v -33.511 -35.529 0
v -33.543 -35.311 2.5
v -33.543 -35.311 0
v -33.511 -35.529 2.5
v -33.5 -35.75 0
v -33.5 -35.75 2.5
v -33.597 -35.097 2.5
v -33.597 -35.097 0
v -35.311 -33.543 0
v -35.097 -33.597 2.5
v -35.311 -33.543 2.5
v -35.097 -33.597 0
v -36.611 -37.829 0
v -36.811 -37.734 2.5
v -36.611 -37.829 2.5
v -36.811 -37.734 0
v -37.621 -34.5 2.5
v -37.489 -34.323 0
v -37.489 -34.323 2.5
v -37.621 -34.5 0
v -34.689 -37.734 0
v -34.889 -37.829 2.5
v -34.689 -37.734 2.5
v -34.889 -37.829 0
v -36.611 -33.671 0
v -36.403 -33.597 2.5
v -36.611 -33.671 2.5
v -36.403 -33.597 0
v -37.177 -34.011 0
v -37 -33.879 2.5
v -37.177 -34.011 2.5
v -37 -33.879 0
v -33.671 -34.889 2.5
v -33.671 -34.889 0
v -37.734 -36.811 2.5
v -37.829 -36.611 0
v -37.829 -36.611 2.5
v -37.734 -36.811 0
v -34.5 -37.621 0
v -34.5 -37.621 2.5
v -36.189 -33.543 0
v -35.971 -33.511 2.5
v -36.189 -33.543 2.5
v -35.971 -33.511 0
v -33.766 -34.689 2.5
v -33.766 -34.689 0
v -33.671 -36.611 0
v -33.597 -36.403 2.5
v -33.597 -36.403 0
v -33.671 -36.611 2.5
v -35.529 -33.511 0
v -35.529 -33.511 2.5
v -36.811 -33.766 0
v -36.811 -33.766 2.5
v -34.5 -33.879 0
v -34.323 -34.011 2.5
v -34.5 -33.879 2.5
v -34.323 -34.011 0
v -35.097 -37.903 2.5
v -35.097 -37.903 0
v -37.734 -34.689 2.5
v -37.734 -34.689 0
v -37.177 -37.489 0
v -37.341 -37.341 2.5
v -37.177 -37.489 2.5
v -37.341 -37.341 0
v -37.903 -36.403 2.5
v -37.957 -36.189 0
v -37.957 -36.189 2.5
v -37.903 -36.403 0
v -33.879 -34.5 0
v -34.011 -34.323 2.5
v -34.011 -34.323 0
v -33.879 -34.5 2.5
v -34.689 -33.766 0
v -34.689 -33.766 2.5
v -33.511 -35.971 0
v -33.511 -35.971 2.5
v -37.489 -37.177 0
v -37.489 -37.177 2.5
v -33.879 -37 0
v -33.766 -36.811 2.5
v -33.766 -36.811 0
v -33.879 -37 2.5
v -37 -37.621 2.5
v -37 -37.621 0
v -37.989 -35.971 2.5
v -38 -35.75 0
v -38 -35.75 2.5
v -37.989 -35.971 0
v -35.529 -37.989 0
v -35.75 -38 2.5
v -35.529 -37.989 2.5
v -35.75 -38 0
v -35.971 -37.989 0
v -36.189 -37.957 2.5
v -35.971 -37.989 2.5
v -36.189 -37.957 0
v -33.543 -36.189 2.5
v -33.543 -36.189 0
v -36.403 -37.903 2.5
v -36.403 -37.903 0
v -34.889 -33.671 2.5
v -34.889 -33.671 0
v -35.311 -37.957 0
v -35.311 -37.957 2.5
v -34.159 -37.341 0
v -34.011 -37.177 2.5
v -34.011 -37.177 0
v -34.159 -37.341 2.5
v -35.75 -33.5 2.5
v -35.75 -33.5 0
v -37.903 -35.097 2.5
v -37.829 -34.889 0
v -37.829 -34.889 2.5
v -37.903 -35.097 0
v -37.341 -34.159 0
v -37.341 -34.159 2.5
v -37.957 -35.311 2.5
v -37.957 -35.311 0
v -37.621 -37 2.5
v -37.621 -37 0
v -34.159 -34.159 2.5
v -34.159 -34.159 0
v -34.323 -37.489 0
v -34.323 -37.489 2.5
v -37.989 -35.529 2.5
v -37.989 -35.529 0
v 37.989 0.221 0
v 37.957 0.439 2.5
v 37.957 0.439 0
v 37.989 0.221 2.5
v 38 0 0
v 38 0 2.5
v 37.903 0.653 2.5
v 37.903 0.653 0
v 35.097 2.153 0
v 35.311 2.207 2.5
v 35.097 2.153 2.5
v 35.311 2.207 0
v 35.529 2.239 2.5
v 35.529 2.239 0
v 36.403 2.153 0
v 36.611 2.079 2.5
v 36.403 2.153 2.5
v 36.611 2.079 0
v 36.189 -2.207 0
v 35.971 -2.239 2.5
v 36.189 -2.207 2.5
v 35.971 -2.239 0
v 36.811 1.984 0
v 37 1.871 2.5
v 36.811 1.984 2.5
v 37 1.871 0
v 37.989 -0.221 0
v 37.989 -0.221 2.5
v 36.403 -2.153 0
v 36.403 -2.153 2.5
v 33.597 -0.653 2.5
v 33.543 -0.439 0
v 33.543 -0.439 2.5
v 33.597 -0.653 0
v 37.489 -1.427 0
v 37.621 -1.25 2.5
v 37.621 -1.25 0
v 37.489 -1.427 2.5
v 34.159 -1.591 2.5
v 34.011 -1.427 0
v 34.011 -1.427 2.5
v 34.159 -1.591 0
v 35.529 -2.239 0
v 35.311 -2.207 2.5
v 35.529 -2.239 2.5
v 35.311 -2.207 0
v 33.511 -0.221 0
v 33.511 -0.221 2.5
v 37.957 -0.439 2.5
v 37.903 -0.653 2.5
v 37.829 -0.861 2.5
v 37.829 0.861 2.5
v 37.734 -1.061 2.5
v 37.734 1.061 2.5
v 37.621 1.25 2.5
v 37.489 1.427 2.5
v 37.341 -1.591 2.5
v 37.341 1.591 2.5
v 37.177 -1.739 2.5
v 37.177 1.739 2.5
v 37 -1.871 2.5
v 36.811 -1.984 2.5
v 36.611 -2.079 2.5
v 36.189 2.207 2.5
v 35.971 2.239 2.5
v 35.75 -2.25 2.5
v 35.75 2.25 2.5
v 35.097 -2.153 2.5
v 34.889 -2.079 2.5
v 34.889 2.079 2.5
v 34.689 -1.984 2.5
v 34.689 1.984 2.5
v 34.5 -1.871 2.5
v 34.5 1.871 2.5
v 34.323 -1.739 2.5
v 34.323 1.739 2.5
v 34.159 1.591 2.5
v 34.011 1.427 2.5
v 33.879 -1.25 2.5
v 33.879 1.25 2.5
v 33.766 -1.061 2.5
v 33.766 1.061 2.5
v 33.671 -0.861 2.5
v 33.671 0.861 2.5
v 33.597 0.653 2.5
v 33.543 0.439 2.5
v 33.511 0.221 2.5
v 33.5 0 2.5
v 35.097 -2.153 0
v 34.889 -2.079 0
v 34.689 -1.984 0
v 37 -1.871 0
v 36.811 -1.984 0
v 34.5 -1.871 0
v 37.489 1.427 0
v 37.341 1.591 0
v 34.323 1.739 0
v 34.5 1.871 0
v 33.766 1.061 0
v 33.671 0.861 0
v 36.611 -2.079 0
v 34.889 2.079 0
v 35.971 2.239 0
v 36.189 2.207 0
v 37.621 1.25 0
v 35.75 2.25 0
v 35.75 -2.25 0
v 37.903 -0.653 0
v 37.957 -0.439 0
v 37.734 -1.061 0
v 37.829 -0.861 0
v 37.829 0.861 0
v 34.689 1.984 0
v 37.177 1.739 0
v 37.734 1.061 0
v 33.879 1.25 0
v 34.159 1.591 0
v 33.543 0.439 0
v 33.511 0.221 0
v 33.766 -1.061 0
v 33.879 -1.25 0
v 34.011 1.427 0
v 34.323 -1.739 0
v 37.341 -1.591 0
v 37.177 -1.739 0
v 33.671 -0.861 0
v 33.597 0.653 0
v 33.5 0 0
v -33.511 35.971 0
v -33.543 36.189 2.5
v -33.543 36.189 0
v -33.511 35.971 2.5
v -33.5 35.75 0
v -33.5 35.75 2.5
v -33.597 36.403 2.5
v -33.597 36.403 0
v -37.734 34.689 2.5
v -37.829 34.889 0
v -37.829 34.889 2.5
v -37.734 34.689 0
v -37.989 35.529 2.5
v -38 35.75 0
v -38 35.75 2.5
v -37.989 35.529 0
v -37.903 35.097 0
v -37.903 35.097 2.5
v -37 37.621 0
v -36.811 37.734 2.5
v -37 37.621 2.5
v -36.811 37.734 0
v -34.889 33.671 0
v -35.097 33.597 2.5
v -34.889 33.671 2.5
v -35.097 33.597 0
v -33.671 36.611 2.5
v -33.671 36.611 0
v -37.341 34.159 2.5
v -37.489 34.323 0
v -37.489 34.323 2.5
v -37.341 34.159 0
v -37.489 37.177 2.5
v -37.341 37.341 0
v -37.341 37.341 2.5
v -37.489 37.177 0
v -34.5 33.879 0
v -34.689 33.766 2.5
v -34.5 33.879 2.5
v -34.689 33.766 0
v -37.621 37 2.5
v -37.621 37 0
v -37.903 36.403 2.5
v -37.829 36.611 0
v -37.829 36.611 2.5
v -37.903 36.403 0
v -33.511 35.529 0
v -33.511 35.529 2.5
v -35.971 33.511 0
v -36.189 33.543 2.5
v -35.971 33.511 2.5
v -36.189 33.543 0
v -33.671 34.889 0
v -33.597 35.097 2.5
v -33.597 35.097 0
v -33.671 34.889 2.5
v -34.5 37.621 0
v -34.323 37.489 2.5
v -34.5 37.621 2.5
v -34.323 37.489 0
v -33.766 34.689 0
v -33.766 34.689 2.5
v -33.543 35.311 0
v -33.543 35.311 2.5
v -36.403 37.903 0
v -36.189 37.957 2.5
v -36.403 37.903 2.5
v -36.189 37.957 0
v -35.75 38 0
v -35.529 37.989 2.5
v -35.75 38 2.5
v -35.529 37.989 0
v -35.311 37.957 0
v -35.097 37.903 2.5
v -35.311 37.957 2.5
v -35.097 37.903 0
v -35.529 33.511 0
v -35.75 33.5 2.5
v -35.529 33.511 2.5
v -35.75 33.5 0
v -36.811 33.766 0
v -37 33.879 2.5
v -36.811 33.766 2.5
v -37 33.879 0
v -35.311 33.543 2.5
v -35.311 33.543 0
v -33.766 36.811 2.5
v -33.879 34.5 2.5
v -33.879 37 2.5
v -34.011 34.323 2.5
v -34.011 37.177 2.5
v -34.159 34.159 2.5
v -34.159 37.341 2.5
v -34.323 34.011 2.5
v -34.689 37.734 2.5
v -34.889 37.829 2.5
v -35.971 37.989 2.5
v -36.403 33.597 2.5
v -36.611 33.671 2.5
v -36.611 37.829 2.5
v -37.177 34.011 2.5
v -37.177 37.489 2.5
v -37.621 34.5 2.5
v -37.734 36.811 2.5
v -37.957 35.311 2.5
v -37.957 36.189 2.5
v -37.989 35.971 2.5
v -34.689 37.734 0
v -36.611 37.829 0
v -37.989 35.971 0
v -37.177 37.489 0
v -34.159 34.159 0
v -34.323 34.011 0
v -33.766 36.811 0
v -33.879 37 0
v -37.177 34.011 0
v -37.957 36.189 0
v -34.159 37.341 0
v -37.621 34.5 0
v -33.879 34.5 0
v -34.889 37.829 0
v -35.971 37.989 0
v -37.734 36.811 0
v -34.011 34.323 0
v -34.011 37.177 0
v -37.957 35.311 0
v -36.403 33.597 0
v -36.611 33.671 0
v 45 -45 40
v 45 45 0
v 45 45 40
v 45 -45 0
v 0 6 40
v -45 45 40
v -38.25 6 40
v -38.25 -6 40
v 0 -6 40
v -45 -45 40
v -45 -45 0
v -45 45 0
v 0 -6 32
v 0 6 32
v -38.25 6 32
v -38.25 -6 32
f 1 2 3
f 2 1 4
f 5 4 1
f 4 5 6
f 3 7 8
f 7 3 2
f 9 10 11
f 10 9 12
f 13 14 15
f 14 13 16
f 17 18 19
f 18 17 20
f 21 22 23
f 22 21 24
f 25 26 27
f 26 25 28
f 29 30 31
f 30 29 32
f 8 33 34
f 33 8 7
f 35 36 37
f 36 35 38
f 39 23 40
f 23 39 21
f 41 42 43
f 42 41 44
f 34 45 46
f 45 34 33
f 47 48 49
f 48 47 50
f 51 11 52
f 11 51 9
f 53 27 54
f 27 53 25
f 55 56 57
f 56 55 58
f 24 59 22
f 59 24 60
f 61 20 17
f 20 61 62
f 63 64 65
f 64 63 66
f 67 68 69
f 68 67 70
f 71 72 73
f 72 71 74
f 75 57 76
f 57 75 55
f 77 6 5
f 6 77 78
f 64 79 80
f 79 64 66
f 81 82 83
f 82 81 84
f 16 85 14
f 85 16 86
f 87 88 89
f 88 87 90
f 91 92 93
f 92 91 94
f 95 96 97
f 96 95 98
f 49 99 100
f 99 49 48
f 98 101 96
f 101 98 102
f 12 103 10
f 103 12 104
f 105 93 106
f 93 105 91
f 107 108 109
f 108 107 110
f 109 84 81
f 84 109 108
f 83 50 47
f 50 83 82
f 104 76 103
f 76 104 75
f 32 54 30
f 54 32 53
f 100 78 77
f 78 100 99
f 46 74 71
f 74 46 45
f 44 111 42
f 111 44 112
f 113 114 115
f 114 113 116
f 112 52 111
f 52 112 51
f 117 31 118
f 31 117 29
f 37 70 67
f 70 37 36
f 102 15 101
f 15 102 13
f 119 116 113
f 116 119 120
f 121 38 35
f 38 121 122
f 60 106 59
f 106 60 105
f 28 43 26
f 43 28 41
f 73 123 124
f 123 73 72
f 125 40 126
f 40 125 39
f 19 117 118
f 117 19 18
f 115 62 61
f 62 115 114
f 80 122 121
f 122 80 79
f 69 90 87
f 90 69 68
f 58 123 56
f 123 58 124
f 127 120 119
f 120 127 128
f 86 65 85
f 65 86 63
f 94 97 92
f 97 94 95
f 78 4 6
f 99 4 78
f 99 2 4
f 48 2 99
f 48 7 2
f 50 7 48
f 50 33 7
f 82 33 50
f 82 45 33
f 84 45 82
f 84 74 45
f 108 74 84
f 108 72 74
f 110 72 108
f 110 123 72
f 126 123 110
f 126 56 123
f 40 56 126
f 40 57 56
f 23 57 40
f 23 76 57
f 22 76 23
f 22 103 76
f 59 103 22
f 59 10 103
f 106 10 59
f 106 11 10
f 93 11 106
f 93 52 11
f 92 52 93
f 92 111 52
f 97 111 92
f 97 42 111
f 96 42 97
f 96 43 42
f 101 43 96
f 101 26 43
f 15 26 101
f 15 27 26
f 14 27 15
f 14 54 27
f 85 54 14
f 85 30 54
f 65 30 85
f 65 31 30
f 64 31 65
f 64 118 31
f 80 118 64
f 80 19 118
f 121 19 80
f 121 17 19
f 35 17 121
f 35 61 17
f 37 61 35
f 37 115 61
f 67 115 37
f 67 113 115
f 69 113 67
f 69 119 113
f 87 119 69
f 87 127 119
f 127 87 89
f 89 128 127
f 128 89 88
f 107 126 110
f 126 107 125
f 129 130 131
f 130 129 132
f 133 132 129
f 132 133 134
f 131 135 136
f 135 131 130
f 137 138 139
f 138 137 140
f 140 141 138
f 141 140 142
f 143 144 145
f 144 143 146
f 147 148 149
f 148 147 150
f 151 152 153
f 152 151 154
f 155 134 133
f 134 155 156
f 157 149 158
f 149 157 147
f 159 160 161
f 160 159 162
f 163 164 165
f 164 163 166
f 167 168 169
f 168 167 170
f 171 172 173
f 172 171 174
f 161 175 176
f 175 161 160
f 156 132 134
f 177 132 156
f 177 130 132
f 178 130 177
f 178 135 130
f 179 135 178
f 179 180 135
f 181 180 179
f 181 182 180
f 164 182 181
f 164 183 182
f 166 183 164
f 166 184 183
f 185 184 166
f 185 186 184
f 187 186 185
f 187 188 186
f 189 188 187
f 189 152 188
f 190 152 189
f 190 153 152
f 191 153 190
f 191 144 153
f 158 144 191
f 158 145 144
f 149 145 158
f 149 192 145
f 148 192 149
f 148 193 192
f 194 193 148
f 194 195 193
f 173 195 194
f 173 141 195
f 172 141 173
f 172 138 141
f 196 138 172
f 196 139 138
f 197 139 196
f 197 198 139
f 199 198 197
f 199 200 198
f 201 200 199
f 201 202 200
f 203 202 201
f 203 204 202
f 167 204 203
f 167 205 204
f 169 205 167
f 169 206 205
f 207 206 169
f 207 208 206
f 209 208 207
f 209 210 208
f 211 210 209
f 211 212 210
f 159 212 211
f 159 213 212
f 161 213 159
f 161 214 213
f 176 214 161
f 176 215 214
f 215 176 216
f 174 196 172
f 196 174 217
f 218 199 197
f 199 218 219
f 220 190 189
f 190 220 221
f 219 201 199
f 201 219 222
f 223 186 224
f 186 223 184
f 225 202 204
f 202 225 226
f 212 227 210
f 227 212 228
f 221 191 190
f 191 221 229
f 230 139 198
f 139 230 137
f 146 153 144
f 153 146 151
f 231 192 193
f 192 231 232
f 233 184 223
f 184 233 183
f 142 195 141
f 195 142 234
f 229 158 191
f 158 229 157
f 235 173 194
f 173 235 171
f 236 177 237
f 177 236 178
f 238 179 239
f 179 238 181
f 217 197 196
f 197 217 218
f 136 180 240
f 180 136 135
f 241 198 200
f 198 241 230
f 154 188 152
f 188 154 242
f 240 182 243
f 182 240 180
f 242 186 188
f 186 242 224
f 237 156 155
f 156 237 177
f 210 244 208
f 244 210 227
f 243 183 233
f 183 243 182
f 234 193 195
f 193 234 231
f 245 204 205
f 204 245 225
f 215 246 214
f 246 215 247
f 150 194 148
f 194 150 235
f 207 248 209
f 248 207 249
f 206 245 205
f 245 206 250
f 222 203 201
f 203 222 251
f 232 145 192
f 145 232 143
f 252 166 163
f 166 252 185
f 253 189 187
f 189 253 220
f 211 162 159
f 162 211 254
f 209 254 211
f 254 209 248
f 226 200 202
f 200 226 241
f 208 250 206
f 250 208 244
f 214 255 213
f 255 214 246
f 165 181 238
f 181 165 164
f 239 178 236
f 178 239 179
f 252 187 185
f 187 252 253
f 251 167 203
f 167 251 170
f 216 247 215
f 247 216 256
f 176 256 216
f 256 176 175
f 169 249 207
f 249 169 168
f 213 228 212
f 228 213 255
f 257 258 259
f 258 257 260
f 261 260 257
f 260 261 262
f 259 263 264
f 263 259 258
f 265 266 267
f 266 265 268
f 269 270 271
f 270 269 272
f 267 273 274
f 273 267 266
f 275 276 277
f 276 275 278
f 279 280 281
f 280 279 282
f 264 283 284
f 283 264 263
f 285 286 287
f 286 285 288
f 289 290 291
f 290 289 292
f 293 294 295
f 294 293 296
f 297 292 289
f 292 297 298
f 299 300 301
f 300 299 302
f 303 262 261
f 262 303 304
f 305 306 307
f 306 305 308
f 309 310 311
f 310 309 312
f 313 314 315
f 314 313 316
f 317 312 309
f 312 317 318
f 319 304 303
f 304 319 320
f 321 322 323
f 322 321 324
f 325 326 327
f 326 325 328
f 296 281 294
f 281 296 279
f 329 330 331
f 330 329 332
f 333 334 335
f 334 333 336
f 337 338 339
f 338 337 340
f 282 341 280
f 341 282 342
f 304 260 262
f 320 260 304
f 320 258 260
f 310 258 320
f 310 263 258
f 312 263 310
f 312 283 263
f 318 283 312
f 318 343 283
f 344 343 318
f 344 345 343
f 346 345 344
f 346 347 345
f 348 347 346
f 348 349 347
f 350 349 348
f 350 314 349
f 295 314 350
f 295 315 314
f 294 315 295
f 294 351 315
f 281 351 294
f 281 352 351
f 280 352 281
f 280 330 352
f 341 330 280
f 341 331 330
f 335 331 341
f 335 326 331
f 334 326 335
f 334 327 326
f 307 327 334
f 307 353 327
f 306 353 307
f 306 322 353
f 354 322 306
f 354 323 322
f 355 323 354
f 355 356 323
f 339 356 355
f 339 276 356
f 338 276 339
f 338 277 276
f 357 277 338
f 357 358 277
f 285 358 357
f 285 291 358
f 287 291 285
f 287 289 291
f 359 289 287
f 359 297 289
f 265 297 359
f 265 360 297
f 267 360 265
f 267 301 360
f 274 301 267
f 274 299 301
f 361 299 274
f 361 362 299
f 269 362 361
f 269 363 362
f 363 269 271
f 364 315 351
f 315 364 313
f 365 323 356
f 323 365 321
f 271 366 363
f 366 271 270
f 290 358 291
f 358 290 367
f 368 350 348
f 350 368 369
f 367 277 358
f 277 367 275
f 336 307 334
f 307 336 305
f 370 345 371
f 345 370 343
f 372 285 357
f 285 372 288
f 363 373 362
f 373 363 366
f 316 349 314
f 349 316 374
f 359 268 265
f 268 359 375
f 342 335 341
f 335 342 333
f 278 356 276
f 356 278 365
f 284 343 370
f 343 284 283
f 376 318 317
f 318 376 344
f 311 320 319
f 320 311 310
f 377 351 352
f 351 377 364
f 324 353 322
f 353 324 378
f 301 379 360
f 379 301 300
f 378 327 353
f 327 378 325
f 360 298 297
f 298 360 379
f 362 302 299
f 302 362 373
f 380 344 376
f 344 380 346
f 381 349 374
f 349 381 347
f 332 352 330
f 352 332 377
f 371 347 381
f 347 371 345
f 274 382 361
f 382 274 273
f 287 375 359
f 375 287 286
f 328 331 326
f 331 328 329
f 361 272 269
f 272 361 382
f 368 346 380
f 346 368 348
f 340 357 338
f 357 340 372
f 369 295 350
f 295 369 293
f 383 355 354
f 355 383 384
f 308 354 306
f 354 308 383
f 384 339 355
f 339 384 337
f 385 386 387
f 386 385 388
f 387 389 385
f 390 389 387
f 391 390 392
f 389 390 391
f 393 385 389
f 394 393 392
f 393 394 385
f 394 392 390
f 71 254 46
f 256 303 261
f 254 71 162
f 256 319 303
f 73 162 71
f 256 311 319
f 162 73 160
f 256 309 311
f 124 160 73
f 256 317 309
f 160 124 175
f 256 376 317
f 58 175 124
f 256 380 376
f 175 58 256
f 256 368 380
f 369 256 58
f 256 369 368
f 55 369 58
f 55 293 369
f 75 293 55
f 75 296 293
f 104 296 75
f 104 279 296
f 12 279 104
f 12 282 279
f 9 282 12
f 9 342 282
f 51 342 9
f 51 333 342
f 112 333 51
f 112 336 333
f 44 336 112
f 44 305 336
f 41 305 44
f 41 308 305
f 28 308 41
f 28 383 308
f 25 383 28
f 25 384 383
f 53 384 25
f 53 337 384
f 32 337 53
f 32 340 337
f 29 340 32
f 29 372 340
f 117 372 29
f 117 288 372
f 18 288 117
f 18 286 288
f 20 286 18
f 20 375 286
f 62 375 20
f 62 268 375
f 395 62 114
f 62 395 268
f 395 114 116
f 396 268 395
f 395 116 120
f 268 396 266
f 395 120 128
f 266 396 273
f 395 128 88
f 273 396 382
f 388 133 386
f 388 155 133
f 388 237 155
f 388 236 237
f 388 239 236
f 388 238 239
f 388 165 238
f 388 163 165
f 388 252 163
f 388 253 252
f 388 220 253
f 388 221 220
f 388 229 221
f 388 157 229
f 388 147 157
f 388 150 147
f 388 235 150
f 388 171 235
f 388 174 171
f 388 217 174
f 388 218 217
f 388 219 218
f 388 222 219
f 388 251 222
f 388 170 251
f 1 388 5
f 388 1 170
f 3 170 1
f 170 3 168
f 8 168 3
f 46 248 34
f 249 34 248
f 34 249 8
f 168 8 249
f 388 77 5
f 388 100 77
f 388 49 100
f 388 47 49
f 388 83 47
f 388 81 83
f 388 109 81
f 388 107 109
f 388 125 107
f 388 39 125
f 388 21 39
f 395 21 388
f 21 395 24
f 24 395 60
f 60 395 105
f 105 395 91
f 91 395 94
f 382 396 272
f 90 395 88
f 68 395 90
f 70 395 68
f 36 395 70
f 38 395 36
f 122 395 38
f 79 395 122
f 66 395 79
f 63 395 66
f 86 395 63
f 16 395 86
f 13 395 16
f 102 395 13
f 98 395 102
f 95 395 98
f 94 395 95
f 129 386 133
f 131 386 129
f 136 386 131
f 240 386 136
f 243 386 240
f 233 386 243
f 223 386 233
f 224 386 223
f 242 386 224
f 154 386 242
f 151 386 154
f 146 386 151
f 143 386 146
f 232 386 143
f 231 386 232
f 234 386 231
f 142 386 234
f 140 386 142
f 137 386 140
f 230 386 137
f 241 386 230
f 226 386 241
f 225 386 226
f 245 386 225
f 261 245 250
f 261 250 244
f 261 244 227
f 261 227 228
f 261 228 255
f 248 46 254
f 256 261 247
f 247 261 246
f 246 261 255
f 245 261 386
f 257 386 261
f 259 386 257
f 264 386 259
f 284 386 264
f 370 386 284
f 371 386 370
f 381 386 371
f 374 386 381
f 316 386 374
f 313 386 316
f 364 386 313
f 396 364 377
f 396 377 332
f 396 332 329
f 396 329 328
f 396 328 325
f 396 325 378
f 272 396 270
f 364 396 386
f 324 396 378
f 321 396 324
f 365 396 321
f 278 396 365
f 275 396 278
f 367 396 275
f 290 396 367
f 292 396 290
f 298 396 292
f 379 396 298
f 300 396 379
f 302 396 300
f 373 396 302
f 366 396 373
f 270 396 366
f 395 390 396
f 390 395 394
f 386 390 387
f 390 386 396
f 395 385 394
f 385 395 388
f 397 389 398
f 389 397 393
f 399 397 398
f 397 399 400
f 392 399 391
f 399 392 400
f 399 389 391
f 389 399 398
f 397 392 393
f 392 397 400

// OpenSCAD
// Magnetic stirrer housing for 80 mm PC case fan
// Print orientation: top plate on bed (z = 0), walls build upward (+Z)

// ---------- Dimensions ----------
plate_t      = 2;     // top plate thickness
wall_t       = 2.5;   // wall thickness
box_h        = 40;    // outer wall height (open top at z = 40)
outer_x      = 90;    // outer size in X
outer_y      = 90;    // outer size in Y
hole_d       = 4.5;   // M4 screw hole diameter
hole_n       = 4;     // number of screw holes
hole_pitch   = 71.5;  // square pattern side length for holes
notch_w      = 12;    // cable notch width
notch_depth  = 8;     // notch depth from open edge (z = 32 to 40)
eps          = 0.5;   // cutter overshoot past faces

$fn = 64;

// ---------- Model ----------
difference() {
    // Solid outer block
    translate([-outer_x / 2, -outer_y / 2, 0])
        cube([outer_x, outer_y, box_h]);

    // Screw holes through top plate
    for (i = [0 : hole_n - 1]) {
        x = (i % 2 - 0.5) * hole_pitch;
        y = (i / 2 - 0.5) * hole_pitch;
        translate([x, y, -eps])
            cylinder(d = hole_d, h = plate_t + 2 * eps);
    }

    // Cable notch in one wall (z = 32 to 40, open edge at 40)
    translate([-hole_pitch / 2 - wall_t, -notch_w / 2, box_h - notch_depth])
        cube([hole_pitch / 2 + wall_t, notch_w, notch_depth + eps]);
}
